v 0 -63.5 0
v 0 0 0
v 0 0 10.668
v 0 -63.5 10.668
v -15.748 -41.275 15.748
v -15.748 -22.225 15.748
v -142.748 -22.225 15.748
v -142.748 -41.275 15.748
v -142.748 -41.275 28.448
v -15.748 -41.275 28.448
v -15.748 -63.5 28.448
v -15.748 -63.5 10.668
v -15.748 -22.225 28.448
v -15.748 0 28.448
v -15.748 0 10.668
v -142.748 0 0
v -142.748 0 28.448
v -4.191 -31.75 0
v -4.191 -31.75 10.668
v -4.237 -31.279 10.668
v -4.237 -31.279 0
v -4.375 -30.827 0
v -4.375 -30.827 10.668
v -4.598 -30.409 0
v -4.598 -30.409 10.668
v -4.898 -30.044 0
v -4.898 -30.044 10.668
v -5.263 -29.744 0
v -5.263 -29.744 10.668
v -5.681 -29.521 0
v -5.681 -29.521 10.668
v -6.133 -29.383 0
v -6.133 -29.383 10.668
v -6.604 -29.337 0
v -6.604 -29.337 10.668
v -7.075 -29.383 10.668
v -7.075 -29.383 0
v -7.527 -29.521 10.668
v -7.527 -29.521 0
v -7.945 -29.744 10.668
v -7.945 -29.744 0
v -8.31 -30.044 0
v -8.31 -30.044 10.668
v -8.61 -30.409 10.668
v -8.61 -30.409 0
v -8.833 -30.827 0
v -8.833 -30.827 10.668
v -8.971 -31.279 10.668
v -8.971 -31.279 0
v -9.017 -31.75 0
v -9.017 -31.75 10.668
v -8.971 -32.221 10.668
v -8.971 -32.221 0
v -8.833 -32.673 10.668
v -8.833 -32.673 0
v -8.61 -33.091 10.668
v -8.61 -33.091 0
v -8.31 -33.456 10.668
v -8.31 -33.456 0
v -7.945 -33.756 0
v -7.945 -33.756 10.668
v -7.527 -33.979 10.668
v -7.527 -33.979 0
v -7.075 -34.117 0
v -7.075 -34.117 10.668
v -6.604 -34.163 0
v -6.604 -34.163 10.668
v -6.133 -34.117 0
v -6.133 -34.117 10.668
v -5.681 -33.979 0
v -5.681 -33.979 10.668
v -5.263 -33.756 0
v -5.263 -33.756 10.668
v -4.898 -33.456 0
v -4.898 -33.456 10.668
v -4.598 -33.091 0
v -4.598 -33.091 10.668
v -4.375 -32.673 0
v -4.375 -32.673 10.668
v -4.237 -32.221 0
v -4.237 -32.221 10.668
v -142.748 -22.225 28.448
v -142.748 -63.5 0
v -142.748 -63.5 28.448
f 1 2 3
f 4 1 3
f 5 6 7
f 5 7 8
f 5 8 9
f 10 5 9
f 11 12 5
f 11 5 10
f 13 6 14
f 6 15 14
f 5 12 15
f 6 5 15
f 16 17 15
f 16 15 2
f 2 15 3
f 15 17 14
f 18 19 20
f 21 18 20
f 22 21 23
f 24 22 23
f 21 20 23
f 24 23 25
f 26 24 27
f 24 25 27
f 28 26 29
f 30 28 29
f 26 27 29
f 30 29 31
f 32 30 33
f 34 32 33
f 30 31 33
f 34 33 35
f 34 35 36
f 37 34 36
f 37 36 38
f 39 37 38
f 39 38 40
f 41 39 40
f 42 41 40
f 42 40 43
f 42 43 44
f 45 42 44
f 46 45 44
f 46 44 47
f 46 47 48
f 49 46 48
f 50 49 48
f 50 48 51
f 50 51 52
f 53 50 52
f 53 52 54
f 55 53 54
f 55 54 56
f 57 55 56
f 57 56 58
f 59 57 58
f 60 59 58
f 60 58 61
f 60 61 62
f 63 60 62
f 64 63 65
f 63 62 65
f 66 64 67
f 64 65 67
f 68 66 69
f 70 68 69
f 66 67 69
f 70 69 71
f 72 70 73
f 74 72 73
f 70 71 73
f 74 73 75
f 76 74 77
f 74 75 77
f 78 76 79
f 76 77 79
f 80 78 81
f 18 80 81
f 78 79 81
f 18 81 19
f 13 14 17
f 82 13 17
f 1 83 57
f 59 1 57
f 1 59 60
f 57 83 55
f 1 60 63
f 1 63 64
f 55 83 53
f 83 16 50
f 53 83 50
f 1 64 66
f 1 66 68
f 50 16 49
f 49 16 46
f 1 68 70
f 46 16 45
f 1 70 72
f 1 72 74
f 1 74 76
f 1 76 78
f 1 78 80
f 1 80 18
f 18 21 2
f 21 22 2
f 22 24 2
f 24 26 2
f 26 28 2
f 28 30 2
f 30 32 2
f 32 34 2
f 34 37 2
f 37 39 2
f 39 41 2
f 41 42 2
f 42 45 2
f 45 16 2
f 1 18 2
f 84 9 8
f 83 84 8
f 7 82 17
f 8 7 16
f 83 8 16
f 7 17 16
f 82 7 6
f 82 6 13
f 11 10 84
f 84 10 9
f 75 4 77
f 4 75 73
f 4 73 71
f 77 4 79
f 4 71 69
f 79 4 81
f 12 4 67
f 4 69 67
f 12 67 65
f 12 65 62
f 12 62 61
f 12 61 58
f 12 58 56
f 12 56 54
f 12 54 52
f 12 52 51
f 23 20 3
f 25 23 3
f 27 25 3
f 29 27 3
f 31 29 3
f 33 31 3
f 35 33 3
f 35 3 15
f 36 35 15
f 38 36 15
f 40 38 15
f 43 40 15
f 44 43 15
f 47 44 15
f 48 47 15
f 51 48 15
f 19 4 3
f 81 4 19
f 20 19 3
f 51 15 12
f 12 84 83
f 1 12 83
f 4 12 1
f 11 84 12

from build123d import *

# Parameters (mm, degrees)
F1_DEPTH = 63.5
F2_R     = 2.413
F3_DEPTH = 10.669
F4_W     = 19.05
F4_H     = 12.7
F5_DEPTH = 142.749


with BuildPart() as f1:
    # F0 (on Front) → F1 (new body)
    with BuildSketch(Plane.XZ):
        Polygon((-15.748, 28.448), (-142.748, 28.448), (-142.748, 0), (0, 0), (0, 10.668), (-15.748, 10.668), align=None)
    extrude(amount=F1_DEPTH)

    # F2 (on face) → F3 (cut, through all)
    with BuildSketch(Plane.XY.offset(10.668)):
        with Locations((-6.604, -31.75)):
            Circle(F2_R)
    extrude(amount=-F3_DEPTH, mode=Mode.SUBTRACT)

    # F4 (on face) → F5 (cut, through all)
    with BuildSketch(Plane(origin=(-142.748, 0, 0), x_dir=(0, -1, 0), z_dir=(-1, 0, 0))):
        with Locations((31.75, 22.098)):
            Rectangle(F4_W, F4_H)
    extrude(amount=-F5_DEPTH, mode=Mode.SUBTRACT)


solid = f1.part
